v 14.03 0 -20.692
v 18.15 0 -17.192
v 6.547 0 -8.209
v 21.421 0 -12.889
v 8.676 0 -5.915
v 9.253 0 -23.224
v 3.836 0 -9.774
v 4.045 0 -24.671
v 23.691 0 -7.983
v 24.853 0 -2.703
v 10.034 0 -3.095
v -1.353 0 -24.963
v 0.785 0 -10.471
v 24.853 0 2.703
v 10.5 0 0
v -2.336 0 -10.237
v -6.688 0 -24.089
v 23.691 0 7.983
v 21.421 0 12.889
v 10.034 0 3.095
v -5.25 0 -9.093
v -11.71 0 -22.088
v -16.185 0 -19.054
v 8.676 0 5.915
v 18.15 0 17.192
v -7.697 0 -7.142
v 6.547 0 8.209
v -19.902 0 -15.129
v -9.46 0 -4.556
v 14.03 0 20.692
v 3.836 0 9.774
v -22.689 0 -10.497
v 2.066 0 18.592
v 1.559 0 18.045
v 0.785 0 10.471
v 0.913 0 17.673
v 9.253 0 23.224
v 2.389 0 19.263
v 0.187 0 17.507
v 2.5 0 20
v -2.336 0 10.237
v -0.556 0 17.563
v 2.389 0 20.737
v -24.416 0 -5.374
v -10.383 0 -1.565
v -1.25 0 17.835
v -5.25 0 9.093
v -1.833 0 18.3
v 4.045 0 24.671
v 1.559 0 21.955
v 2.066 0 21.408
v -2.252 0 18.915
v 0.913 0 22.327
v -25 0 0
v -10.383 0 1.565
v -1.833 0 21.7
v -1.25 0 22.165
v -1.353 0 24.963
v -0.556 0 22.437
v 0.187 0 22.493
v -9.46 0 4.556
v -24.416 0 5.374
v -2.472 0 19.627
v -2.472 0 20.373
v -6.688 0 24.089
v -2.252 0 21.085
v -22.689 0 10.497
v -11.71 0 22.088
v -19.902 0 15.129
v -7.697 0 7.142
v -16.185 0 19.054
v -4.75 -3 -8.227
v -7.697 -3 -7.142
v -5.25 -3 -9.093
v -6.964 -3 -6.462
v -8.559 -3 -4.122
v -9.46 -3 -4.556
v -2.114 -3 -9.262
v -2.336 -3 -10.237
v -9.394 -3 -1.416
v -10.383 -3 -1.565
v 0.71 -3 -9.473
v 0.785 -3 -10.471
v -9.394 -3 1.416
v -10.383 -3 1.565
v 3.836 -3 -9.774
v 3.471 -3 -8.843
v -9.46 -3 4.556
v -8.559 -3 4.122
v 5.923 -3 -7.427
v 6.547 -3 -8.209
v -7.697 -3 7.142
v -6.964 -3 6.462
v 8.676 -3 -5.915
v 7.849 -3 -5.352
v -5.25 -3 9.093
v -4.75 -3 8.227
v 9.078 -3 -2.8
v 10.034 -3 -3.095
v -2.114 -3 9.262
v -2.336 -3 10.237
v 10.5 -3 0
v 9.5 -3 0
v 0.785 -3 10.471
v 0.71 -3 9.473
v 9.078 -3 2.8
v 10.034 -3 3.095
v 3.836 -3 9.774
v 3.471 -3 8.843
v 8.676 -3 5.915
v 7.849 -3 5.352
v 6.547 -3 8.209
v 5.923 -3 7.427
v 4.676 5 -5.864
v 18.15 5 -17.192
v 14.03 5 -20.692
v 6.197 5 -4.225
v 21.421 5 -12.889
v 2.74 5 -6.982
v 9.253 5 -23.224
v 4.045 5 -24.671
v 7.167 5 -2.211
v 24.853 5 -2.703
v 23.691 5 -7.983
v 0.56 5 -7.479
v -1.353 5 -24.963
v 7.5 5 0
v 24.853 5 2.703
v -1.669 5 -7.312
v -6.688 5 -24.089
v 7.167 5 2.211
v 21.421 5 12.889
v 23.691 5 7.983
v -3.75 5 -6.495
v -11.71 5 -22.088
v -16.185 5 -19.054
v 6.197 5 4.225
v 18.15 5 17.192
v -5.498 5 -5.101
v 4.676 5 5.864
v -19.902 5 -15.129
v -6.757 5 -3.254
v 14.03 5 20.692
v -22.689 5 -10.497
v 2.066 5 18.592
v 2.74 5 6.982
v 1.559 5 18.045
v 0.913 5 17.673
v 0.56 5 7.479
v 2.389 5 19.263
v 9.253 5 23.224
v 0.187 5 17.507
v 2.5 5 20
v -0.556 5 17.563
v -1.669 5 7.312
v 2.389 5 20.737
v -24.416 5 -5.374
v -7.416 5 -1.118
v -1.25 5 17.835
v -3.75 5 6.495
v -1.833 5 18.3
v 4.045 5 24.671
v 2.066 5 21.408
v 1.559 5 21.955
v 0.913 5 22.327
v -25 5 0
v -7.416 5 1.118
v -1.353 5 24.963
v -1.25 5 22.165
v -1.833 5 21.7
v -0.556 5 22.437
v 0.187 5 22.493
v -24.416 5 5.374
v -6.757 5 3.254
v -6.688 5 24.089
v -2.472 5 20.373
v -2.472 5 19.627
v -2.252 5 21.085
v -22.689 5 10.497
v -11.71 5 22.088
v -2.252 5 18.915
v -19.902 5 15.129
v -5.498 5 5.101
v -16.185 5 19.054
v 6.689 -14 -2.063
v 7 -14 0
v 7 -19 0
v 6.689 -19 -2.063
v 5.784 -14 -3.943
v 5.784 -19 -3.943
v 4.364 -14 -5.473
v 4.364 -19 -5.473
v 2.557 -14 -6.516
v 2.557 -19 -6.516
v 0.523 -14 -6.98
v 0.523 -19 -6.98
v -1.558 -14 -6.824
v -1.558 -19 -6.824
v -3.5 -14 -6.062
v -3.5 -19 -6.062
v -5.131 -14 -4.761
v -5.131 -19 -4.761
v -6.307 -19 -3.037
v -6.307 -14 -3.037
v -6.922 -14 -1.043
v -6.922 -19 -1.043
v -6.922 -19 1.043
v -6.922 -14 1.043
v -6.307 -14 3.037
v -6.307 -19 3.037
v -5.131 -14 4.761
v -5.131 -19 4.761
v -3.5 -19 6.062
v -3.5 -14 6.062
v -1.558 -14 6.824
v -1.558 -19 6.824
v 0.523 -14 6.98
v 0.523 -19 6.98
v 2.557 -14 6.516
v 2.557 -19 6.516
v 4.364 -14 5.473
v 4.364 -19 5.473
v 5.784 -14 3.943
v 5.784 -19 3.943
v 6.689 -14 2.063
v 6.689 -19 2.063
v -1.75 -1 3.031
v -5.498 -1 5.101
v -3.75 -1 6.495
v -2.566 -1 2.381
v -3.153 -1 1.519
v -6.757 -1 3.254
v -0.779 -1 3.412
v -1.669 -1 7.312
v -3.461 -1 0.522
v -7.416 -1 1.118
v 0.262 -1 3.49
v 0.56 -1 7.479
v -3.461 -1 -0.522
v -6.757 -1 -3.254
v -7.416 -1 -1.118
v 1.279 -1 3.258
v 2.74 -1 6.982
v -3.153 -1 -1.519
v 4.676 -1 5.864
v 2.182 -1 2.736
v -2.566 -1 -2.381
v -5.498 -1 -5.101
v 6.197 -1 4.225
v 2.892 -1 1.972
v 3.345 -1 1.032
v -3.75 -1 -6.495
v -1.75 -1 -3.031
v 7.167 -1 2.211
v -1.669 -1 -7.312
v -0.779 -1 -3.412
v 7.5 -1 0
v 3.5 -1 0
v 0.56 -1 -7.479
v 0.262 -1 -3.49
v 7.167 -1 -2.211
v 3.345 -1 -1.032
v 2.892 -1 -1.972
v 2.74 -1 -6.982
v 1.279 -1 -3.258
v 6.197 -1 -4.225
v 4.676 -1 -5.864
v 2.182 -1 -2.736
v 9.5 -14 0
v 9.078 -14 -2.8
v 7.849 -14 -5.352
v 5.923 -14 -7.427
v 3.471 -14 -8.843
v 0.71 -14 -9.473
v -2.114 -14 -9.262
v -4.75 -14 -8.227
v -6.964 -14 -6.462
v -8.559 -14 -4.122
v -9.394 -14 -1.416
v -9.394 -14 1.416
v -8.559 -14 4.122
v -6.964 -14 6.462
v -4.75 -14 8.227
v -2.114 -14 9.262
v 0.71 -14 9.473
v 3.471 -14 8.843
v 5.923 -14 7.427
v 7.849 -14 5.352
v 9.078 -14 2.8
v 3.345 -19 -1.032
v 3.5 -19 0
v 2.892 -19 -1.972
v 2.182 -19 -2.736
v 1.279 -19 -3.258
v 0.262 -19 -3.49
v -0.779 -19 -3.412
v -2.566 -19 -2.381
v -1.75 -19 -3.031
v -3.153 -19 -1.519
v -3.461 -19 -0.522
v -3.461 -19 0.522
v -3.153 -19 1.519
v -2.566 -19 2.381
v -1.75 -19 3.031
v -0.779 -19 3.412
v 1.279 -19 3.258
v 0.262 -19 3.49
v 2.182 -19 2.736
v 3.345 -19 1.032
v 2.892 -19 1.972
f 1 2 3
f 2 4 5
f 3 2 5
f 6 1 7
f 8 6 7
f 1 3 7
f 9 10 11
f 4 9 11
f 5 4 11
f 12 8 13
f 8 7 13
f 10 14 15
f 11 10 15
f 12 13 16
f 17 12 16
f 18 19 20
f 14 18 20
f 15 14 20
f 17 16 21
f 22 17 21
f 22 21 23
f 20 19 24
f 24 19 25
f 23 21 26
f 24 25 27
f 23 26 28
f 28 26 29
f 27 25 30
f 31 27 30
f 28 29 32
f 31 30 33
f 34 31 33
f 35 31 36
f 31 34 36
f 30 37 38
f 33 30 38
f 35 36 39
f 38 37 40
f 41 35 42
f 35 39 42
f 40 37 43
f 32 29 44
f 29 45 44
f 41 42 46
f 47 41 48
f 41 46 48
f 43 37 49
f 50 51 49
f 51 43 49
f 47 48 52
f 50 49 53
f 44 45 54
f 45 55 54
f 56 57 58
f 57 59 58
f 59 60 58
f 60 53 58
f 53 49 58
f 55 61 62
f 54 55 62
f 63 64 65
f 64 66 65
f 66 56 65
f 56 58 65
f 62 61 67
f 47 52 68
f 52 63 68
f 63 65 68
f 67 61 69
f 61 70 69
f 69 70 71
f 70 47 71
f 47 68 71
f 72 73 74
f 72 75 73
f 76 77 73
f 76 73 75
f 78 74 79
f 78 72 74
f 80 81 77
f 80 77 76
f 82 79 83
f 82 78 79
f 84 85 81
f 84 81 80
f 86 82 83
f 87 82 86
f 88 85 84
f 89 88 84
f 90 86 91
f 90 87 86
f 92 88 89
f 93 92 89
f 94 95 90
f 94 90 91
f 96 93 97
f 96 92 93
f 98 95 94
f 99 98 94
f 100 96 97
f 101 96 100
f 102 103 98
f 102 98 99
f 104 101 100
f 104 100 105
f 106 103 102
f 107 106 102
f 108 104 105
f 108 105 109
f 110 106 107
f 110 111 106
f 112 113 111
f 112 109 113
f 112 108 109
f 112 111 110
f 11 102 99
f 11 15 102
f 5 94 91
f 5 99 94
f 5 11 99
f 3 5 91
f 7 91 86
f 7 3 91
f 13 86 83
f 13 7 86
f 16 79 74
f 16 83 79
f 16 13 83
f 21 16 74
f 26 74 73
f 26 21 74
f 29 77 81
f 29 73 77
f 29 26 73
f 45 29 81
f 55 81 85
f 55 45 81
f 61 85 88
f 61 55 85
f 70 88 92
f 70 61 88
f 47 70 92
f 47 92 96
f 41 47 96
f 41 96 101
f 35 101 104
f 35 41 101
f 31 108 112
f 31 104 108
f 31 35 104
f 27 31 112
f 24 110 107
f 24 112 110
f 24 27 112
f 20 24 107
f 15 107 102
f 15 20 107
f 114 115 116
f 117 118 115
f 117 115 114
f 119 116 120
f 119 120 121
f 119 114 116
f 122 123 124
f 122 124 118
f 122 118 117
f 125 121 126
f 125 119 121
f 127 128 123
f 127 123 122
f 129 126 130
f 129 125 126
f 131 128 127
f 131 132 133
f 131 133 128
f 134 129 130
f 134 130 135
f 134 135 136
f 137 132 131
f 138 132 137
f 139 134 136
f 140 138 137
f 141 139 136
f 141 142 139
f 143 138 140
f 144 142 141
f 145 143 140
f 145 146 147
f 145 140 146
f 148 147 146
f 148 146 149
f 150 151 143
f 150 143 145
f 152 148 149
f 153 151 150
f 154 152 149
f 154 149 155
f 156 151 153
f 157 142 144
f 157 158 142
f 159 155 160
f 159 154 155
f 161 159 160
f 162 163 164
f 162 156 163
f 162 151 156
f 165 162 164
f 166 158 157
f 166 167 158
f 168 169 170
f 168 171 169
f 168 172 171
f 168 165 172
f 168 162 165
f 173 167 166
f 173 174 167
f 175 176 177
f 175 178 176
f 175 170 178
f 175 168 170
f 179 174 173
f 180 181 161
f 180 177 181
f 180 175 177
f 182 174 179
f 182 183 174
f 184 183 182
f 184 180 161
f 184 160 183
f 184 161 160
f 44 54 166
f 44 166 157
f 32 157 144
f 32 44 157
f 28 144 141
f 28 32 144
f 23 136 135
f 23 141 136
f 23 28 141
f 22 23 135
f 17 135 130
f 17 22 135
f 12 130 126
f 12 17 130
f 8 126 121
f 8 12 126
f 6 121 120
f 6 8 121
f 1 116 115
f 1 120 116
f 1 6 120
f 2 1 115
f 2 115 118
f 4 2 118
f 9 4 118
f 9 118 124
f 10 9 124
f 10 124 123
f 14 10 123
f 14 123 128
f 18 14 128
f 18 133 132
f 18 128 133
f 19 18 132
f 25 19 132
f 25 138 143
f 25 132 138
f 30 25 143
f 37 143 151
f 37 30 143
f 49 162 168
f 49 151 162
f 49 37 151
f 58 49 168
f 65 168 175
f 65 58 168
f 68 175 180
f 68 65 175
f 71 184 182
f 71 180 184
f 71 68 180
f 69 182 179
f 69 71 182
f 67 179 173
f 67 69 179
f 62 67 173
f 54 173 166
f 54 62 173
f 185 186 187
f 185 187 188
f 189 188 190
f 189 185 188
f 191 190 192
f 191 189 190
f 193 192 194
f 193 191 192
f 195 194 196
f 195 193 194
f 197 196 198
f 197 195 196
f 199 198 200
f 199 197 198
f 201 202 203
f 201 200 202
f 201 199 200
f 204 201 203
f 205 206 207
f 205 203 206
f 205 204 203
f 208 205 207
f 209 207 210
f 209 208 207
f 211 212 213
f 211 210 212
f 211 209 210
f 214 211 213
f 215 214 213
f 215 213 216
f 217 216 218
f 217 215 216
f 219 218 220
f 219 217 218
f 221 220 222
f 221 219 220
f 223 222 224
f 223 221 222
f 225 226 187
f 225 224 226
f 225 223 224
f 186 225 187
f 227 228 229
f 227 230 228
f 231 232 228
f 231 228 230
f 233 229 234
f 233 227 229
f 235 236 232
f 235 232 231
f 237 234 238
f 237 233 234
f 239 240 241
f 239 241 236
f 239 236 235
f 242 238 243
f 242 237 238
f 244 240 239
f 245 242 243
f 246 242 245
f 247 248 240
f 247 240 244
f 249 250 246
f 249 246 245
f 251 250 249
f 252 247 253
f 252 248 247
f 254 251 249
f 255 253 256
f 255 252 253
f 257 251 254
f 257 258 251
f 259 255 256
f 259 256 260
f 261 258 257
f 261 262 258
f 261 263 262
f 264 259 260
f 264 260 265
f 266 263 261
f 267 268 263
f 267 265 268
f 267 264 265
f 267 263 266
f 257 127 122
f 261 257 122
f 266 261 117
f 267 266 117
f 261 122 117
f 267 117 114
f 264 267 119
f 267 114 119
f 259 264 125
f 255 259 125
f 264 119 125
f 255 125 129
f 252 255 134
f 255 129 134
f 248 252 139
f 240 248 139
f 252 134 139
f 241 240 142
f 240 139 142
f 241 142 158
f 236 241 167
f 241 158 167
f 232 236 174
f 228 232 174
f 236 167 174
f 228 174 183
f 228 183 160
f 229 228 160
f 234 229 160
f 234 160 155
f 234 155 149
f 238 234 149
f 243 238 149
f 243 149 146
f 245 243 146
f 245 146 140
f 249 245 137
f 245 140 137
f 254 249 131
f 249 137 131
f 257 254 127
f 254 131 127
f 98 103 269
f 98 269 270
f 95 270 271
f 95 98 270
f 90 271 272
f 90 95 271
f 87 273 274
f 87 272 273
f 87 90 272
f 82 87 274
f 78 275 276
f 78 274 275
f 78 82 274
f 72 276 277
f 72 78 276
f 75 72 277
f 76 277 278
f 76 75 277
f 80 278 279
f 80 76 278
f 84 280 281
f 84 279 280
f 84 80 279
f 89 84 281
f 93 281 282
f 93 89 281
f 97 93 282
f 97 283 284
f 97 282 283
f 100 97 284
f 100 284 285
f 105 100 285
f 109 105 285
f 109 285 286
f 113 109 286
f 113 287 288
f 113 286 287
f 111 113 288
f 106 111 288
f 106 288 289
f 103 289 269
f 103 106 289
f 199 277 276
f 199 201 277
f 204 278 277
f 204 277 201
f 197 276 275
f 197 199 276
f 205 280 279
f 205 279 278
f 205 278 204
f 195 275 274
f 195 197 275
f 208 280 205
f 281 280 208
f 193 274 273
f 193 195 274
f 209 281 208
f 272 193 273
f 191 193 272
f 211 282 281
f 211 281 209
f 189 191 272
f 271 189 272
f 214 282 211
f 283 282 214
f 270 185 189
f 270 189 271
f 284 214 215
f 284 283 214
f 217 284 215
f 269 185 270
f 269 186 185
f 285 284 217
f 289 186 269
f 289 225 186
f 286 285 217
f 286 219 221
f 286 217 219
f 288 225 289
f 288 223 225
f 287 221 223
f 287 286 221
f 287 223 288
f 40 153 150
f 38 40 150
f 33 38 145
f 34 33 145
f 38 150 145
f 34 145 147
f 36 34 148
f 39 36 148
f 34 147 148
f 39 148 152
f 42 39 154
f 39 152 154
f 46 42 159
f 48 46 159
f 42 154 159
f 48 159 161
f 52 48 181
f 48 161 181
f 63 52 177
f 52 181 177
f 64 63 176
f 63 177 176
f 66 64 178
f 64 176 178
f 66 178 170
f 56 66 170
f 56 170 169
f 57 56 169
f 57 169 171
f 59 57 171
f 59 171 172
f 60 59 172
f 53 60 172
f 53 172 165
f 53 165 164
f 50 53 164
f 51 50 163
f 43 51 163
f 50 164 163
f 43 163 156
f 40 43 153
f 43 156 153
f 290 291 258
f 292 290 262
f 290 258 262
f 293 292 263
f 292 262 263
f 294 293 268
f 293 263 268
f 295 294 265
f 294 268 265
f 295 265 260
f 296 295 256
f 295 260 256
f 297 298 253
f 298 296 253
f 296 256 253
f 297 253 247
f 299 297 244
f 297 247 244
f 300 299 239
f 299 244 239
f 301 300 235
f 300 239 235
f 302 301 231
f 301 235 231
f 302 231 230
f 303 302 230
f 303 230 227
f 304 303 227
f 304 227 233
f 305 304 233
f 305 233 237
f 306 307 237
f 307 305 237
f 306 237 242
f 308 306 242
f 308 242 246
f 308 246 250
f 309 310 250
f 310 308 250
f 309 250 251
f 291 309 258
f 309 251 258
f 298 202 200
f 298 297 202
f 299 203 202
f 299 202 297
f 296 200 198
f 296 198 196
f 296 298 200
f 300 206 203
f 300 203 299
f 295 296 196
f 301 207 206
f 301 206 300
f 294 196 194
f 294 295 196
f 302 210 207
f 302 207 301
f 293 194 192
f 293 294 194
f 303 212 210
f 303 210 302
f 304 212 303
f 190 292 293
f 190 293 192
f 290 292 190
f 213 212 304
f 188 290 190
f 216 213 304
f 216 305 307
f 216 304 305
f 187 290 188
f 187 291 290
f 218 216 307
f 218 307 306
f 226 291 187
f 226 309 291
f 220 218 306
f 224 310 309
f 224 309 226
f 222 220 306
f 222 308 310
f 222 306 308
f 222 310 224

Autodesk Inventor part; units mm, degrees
ref_plane "YZ Plane" through (0, 0, 0) normal (1, 0, 0) x (0, 1, 0)
ref_plane "XZ Plane" through (0, 0, 0) normal (0, 1, 0) x (-1, 0, 0)
ref_plane "XY Plane" through (0, 0, 0) normal (0, 0, 1) x (1, 0, 0)
sketch "Sketch1" plane through (0, 0, 0) normal (0, 1, 0) x (-1, 0, 0)
  circle A0 centre (0, 0) radius 25
  dimension "d0" = 50
extrude "Extrusion1" add sketch "Sketch1" along normal blind 5
sketch "Sketch4" plane through (0, 5, 0) normal (0, 1, 0) x (1, 0, 0)
  circle A0 centre (0, 0) radius 20 construction
  circle A1 centre (0, -20) radius 2.5
  dimension "d8" = 40
  dimension "d9" = 5
extrude "Extrusion3" cut sketch "Sketch4" against normal through all
sketch "Sketch5" plane through (0, 0, 0) normal (0, -1, 0) x (1, 0, 0)
  circle A0 centre (0, 0) radius 10.5
  dimension "d12" = 21
extrude "Extrusion4" add sketch "Sketch5" along normal blind 3
sketch "Sketch6" plane through (0, -3, 0) normal (0, -1, 0) x (1, 0, 0)
  circle A0 centre (0, 0) radius 9.5
  dimension "d15" = 19
extrude "Extrusion5" add sketch "Sketch6" along normal blind 11
sketch "Sketch7" plane through (0, 5, 0) normal (0, 1, 0) x (1, 0, 0)
  circle A0 centre (0, 0) radius 7.5
  dimension "d18" = 15
extrude "Extrusion6" cut sketch "Sketch7" against normal blind 6
sketch "Sketch8" plane through (0, -1, 0) normal (0, 1, 0) x (1, 0, 0)
  circle A0 centre (0, 0) radius 3.5
  dimension "d21" = 7
extrude "Extrusion7" cut sketch "Sketch8" against normal through all
sketch "Sketch9" plane through (0, -14, 0) normal (0, -1, 0) x (1, 0, 0)
  circle A0 centre (0, 0) radius 3.5
  circle A1 centre (0, 0) radius 10.5 projected
  circle A2 centre (0, 0) radius 7
  dimension "d24" = 14
extrude "Extrusion8" add sketch "Sketch9" along normal blind 5 contours A2
sketch "Sketch10" plane through (0, 0, 0) normal (0, -1, 0) x (1, 0, 0)
  line L0 (0, 0) -> (0, 39) construction
  circle A0 centre (0, 20) radius 2.5 projected
properties part number "sprzeglo_03"
